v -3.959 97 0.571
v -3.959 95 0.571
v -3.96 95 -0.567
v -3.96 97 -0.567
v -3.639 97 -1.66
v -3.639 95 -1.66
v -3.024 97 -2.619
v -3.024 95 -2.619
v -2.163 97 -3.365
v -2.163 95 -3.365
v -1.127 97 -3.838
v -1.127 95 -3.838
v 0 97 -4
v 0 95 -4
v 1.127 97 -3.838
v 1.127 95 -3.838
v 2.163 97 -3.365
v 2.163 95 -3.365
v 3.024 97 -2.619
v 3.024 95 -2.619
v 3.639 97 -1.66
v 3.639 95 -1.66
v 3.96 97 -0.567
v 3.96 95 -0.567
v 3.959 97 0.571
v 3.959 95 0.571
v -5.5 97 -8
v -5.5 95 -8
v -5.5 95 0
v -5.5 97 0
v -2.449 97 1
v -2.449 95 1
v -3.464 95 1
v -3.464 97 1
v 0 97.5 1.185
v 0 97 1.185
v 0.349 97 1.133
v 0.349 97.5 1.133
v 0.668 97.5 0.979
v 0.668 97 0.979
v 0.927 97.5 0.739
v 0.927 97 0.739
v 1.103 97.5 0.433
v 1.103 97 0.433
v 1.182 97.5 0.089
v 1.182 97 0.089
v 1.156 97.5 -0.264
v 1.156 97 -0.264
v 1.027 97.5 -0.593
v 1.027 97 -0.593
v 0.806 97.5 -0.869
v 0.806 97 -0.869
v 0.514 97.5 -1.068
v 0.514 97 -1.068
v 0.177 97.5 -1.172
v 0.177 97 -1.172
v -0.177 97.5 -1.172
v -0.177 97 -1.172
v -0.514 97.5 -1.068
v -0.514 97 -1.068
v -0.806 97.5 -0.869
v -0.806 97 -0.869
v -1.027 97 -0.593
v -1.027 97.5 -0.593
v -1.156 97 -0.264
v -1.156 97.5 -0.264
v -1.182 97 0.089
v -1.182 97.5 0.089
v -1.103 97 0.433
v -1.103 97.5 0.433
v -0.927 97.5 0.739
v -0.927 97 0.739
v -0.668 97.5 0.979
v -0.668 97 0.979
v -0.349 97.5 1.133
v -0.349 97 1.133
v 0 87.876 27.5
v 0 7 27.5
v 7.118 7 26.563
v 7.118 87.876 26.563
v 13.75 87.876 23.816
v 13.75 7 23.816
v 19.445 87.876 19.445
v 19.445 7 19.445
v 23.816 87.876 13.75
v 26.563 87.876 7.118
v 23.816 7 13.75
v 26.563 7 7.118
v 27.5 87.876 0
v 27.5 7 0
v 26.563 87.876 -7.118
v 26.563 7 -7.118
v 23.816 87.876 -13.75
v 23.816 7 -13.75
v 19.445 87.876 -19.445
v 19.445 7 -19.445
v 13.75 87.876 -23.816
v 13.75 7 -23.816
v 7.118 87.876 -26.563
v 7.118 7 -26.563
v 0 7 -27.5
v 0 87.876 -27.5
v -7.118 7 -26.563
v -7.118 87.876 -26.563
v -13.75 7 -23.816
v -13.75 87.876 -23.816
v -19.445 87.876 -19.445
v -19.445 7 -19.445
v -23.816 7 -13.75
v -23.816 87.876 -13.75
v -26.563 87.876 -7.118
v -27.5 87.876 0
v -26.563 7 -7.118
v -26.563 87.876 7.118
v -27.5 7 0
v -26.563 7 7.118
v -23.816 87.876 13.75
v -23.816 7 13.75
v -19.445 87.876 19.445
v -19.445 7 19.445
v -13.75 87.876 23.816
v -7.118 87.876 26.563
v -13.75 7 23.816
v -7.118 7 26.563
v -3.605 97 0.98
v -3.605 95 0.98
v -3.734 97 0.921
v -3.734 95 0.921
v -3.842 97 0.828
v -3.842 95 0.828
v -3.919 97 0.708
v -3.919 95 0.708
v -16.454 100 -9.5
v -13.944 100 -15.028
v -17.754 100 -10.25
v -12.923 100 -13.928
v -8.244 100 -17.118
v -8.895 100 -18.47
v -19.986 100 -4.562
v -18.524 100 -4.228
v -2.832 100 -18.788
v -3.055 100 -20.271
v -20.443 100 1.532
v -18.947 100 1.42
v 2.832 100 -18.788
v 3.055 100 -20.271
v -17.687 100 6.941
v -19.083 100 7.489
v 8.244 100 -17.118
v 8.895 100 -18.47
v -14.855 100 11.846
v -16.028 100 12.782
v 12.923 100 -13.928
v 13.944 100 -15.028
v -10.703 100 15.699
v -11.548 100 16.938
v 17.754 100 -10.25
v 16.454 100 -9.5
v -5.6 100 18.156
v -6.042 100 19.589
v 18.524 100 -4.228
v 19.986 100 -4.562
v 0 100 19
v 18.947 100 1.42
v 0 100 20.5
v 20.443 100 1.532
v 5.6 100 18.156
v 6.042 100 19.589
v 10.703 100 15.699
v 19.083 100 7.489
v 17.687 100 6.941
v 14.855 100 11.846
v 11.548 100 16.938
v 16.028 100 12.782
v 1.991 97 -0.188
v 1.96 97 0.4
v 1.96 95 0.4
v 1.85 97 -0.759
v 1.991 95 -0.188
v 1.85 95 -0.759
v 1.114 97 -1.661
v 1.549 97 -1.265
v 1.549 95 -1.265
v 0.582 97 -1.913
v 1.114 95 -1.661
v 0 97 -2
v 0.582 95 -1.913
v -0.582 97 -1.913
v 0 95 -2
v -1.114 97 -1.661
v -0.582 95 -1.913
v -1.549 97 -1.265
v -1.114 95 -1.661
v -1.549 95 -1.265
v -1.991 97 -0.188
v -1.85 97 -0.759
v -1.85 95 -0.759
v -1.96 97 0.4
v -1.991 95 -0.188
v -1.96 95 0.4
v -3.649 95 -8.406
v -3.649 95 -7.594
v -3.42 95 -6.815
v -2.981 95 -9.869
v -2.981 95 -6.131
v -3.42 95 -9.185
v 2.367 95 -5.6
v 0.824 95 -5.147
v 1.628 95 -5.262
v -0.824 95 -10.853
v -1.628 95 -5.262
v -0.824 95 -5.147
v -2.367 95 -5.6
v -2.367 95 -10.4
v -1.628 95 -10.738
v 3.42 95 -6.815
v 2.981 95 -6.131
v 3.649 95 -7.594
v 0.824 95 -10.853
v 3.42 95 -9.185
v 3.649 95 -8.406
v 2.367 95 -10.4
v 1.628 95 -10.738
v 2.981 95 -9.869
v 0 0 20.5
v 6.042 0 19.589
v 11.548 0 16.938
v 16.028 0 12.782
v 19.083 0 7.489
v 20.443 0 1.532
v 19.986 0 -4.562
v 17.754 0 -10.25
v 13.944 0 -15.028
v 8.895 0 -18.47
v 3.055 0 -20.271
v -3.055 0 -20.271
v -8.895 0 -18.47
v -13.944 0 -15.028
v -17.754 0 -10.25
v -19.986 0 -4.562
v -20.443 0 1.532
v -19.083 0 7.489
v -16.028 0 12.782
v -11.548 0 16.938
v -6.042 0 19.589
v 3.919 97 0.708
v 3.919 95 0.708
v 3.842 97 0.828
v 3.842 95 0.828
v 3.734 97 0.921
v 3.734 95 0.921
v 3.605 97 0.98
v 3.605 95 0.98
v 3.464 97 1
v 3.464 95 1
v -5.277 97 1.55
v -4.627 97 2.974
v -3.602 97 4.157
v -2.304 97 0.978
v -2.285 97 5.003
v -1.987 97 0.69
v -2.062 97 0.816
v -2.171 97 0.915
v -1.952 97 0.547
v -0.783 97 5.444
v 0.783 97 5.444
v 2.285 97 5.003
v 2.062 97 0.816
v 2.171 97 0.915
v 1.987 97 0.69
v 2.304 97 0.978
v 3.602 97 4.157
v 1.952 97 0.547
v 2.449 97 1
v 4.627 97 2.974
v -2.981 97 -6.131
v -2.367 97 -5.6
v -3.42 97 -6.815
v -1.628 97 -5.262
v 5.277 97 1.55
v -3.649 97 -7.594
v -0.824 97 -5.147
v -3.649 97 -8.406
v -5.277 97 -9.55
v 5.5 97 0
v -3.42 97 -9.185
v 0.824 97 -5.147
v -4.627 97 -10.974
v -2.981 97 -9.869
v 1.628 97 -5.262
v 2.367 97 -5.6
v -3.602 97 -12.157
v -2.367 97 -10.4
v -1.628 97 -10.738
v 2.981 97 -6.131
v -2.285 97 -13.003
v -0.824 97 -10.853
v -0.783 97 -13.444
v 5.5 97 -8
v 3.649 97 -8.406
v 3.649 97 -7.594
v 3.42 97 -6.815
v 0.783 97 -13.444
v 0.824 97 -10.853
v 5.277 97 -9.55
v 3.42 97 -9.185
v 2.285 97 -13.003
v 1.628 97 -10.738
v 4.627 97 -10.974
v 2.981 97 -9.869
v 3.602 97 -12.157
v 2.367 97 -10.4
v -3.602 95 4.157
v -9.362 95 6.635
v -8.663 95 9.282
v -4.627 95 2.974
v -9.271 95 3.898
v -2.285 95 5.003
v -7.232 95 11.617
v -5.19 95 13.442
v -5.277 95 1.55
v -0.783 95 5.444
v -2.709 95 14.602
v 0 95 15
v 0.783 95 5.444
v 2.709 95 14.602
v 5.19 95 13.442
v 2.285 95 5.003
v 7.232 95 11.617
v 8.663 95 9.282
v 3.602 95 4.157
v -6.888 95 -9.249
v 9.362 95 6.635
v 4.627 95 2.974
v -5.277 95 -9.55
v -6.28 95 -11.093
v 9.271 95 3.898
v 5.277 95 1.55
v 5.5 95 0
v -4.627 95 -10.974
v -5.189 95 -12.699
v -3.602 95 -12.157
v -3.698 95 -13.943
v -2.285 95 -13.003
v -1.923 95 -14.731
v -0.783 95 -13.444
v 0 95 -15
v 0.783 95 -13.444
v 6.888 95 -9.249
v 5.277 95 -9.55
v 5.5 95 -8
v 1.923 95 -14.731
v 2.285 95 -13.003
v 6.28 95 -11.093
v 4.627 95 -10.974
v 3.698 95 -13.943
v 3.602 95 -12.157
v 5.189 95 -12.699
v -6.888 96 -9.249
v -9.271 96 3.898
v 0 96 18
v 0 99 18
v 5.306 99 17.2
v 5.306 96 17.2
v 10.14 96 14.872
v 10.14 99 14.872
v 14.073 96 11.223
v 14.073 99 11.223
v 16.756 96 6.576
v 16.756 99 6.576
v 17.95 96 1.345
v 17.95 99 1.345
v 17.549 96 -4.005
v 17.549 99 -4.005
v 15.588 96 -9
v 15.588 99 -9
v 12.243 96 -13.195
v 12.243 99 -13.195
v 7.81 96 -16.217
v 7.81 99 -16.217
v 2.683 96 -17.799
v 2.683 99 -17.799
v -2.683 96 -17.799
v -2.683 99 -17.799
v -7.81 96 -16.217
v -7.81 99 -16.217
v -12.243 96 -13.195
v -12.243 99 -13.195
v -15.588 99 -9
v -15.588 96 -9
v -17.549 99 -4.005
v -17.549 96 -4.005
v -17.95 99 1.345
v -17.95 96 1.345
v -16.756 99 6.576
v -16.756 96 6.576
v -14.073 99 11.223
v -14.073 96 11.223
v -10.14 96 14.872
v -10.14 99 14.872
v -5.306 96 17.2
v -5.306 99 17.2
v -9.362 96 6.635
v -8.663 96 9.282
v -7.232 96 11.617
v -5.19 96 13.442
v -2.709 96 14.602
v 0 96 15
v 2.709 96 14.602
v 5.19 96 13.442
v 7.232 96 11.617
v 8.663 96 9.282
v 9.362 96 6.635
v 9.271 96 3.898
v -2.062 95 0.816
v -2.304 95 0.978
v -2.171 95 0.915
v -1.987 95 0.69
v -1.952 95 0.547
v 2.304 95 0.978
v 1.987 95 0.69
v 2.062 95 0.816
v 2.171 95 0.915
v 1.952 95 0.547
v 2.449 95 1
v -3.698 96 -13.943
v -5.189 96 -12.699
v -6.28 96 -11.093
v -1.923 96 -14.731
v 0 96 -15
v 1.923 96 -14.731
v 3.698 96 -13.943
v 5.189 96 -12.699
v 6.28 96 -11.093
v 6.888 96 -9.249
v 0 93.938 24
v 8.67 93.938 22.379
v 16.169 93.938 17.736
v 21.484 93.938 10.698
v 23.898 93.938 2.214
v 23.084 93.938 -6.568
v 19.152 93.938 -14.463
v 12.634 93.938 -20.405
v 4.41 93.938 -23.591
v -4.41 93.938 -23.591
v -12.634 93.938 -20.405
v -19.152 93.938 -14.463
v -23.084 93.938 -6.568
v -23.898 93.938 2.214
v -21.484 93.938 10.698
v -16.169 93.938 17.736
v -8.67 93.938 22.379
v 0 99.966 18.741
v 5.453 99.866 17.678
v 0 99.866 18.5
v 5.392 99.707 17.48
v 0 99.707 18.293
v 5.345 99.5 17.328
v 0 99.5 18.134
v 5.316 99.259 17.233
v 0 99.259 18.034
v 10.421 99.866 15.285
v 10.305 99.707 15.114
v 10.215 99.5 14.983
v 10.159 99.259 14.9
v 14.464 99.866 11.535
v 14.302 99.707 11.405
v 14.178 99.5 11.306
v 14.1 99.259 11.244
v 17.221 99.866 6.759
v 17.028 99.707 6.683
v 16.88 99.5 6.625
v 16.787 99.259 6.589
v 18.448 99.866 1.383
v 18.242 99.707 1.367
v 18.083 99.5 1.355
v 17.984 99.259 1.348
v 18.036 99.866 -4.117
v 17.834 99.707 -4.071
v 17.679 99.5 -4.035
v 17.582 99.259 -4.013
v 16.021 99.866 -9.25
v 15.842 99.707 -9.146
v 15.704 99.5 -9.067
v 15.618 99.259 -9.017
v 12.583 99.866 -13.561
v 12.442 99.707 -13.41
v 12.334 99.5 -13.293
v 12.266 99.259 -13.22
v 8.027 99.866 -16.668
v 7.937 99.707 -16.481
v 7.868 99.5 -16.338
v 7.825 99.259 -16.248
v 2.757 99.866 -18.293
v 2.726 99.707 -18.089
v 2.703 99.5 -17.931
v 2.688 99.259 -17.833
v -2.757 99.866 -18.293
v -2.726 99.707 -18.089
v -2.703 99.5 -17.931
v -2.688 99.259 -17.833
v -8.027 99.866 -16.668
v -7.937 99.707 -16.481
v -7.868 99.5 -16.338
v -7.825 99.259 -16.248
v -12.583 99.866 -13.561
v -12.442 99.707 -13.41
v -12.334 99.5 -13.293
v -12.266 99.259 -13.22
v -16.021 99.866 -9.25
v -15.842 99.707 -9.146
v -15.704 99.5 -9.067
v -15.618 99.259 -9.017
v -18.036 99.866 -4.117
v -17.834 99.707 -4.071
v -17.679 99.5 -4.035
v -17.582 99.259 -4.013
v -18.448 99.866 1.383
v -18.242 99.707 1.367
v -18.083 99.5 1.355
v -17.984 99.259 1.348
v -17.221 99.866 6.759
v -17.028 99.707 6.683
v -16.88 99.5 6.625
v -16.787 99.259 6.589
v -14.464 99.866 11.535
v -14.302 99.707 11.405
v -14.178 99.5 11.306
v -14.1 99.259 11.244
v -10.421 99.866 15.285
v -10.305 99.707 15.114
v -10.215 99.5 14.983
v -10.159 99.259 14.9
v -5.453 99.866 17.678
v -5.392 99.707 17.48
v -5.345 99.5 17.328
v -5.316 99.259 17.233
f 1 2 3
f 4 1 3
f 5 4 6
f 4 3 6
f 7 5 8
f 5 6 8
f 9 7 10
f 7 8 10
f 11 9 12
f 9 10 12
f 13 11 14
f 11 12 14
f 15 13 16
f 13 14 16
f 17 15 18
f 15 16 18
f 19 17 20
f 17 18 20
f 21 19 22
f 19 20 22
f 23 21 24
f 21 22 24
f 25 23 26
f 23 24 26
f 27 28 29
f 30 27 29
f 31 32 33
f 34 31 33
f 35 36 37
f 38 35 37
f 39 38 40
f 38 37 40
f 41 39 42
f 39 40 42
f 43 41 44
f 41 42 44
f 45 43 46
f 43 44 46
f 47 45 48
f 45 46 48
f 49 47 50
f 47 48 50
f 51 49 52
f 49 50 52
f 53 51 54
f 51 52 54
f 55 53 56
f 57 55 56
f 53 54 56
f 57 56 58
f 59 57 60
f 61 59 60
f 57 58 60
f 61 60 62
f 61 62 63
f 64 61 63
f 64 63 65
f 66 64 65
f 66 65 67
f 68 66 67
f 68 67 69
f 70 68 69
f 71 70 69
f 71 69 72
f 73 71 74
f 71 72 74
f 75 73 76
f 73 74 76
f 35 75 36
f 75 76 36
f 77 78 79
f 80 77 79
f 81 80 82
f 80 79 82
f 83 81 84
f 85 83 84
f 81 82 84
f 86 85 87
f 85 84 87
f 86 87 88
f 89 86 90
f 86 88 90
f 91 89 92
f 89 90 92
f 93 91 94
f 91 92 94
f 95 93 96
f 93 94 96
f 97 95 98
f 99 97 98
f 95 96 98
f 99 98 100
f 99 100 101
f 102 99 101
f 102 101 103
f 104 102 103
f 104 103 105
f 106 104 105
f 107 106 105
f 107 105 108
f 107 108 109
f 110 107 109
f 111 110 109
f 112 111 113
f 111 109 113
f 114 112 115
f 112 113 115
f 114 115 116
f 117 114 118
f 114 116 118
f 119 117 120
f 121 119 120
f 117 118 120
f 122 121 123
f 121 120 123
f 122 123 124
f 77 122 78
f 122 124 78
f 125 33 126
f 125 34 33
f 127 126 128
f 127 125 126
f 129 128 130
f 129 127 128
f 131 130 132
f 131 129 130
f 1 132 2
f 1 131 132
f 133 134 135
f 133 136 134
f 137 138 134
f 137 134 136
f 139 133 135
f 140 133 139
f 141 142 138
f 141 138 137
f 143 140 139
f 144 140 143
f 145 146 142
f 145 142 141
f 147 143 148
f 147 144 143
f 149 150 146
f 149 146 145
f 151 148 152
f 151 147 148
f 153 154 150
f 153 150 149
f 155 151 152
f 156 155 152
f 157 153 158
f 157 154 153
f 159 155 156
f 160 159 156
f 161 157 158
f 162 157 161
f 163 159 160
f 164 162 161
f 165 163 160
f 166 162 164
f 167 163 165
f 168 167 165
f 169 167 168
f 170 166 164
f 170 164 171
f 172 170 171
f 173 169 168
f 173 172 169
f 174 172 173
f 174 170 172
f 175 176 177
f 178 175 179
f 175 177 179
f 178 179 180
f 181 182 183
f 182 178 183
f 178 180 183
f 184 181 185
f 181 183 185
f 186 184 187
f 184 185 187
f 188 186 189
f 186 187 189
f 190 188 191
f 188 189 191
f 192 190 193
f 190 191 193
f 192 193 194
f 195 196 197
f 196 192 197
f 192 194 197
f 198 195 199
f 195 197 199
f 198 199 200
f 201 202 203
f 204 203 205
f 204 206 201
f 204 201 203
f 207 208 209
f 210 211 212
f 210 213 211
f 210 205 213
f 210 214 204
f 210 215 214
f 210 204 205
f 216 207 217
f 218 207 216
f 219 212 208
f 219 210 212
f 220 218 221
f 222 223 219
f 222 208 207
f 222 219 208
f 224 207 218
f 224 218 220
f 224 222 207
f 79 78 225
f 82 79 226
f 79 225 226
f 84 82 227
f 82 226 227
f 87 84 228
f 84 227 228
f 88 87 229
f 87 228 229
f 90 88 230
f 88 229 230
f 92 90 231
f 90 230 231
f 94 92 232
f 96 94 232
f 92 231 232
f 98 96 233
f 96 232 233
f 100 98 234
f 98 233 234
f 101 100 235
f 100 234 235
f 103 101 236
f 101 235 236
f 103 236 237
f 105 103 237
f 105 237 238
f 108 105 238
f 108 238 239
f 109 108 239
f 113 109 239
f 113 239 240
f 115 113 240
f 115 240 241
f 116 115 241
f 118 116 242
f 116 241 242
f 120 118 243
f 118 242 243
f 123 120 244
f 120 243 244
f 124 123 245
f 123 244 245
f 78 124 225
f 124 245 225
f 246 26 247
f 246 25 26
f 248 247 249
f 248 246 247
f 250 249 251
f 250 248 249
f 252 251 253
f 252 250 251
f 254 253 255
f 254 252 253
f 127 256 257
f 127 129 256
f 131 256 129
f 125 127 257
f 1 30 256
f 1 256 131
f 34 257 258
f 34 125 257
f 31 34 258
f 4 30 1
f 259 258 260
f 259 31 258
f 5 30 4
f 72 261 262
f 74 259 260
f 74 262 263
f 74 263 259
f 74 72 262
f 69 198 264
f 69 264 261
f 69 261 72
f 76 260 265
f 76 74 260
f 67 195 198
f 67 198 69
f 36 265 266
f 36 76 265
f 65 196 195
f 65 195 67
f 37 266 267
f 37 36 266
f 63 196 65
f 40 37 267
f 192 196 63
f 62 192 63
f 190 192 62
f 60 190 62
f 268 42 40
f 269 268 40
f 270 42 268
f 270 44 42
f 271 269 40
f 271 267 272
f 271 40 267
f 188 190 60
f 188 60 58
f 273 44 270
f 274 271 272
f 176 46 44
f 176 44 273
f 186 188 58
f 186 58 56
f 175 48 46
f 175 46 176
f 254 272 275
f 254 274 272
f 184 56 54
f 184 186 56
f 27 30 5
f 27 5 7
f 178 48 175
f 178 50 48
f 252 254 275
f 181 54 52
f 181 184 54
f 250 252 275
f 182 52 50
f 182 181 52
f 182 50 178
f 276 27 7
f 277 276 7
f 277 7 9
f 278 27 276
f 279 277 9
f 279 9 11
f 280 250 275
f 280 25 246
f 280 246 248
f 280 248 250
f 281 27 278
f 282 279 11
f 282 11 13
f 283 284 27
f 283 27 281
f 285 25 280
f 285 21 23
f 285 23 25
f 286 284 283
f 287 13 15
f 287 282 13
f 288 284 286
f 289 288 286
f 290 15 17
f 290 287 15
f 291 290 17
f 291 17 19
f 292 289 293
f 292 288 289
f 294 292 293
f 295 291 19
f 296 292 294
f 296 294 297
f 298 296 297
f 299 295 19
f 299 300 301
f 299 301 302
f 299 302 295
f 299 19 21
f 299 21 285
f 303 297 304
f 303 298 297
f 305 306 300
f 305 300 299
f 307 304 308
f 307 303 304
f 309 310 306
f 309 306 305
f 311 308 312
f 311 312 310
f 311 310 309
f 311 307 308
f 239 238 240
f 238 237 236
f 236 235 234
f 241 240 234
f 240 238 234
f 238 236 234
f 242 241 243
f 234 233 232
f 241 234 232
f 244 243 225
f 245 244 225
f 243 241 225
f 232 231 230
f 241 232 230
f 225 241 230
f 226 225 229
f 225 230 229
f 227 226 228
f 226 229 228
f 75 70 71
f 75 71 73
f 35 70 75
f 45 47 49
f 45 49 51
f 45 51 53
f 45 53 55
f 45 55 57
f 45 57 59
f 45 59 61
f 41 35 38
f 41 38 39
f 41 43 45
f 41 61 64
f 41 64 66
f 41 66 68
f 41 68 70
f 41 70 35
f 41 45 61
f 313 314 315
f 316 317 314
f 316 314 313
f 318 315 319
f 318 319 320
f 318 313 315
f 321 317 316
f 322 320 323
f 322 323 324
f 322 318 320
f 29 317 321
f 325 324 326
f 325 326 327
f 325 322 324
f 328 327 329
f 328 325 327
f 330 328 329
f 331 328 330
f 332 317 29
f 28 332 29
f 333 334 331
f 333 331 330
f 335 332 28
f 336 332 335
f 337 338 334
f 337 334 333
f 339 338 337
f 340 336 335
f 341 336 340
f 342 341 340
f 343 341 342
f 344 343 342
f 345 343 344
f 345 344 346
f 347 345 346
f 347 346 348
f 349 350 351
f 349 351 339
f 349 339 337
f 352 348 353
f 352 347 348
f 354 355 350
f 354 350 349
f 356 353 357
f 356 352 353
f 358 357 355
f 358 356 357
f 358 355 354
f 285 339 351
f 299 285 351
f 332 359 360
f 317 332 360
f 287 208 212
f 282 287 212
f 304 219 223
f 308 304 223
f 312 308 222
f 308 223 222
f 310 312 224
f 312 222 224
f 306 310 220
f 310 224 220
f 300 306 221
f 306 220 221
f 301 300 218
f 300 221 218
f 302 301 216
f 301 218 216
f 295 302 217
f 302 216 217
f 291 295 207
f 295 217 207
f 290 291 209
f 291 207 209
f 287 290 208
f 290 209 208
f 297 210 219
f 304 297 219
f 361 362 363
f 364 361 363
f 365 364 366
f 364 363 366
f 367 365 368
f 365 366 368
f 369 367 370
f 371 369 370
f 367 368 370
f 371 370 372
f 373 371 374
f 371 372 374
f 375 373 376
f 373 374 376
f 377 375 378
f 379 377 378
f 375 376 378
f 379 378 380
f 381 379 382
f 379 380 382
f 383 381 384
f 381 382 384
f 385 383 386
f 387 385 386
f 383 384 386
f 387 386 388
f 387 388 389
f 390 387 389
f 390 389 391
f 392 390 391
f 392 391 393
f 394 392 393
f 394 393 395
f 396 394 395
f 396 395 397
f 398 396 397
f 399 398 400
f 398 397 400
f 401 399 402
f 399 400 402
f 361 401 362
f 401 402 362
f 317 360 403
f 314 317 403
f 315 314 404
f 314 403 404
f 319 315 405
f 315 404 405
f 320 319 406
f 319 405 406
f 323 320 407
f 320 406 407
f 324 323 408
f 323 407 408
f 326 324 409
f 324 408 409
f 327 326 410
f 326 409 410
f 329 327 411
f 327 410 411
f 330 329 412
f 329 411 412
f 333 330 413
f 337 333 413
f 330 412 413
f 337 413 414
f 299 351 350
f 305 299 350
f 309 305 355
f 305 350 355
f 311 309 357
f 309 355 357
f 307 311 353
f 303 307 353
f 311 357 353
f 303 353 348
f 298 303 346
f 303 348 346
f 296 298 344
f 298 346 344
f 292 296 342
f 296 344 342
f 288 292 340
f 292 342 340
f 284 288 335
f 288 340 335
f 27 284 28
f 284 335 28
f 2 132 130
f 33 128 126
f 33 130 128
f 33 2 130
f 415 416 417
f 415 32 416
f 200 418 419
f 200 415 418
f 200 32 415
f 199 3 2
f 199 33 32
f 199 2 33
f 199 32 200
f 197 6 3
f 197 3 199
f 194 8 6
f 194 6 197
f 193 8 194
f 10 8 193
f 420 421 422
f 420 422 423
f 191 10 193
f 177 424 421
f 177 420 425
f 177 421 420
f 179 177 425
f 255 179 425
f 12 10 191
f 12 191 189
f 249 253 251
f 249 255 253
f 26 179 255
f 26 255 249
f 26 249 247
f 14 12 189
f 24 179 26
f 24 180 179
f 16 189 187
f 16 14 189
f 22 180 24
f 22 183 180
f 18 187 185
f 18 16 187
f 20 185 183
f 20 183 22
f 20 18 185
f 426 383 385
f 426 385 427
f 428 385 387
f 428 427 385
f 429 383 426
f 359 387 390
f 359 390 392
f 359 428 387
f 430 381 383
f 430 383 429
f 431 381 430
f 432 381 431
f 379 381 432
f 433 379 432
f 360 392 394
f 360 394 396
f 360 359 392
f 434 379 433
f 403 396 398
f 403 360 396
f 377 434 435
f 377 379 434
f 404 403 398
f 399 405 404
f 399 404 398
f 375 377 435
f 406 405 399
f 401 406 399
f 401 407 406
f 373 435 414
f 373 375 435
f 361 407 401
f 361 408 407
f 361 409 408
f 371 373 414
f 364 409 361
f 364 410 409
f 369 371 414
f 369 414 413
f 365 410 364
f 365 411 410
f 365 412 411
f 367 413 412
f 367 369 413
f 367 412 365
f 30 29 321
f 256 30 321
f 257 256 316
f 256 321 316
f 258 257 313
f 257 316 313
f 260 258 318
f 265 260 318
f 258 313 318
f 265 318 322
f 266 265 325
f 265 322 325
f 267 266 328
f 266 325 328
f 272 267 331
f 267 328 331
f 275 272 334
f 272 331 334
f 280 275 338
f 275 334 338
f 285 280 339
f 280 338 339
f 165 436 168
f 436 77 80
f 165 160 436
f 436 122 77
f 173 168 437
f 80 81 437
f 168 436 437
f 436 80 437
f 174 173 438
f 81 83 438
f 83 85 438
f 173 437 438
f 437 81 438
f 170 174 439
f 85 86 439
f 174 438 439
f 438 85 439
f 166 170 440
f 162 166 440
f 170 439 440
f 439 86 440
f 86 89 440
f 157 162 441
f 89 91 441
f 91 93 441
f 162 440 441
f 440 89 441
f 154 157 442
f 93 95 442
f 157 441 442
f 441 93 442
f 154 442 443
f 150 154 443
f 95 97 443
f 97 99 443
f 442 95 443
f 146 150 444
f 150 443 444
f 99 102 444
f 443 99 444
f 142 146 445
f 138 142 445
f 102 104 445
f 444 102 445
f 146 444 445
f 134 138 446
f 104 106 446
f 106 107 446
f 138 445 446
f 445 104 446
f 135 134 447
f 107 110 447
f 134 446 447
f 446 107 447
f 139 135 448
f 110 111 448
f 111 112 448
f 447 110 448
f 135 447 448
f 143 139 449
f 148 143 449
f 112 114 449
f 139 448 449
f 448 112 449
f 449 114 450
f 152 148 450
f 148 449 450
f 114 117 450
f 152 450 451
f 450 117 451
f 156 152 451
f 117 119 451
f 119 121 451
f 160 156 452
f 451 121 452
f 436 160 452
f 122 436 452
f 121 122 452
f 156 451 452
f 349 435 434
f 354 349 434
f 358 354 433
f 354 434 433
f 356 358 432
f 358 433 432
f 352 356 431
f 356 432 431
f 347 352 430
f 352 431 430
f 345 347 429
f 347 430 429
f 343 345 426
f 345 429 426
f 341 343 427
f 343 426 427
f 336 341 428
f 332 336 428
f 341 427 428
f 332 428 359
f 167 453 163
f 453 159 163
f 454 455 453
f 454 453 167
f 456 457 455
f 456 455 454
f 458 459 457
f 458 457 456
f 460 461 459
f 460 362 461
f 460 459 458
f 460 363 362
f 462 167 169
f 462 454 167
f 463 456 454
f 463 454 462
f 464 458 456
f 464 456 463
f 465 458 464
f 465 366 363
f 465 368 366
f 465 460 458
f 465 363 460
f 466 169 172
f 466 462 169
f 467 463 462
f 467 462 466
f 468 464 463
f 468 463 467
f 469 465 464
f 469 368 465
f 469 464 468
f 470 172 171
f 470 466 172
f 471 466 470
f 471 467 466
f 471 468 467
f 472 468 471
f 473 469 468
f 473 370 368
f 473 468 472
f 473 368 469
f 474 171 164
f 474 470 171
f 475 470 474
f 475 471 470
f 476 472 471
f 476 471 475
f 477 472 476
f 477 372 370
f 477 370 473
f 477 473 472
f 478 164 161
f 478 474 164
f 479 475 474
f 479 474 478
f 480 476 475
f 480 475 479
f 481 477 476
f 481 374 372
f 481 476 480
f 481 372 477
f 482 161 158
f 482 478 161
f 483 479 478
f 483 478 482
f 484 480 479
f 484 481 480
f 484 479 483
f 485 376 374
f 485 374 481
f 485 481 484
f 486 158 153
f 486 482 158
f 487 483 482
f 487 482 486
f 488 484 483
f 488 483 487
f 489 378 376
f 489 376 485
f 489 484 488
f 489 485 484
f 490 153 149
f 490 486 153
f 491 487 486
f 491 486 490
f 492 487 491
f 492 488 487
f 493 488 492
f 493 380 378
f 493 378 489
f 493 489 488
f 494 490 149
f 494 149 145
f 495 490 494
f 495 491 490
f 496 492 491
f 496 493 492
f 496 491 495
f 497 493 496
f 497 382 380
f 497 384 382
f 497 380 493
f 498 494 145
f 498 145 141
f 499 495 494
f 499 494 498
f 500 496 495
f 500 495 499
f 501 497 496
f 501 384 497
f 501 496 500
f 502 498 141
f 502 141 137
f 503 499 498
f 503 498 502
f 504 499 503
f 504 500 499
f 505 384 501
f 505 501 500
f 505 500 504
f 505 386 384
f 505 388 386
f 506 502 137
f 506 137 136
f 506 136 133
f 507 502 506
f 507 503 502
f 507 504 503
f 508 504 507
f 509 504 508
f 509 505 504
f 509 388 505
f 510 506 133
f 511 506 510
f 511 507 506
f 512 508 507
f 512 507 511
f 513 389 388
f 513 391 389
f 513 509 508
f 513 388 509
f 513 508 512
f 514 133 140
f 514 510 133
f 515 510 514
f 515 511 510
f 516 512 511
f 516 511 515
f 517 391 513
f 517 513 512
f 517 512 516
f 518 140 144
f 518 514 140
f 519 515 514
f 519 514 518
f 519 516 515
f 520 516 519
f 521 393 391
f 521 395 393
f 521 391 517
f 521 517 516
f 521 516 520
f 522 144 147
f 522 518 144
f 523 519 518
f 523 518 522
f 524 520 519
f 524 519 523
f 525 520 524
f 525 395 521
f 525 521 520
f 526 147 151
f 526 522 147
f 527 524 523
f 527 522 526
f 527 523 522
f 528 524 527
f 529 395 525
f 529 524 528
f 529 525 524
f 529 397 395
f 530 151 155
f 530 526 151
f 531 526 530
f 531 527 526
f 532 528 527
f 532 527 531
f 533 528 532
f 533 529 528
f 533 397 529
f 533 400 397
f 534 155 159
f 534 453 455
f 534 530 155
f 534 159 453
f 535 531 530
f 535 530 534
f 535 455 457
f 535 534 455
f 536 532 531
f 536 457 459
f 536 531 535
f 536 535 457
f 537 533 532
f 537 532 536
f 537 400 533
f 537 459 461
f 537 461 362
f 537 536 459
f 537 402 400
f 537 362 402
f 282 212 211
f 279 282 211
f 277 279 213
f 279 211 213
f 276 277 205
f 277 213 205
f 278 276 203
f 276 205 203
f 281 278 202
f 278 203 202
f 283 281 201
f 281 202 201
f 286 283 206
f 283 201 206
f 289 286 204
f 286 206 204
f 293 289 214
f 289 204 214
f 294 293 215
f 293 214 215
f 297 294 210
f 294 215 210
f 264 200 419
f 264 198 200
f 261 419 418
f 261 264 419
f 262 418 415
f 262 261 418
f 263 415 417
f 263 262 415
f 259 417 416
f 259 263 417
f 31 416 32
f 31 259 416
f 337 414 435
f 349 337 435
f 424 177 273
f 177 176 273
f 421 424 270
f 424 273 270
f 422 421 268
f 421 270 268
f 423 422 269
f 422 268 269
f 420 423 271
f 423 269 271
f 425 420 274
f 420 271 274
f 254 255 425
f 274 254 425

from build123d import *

# Parameters (mm, degrees)
SKETCH1_R           = 27.5
BOSS_EXTRUDE1_DEPTH = 100
CHAMFER1_SIZE       = 7
CHAMFER1_SIZE2      = 12.124355653
CHAMFER2_SIZE       = 7
SKETCH2_R           = 18
CUT_EXTRUDE1_DEPTH  = 4
FILLET1_R           = 1
CUT_EXTRUDE2_DEPTH  = 1
SKETCH6_R           = 2
BOSS_EXTRUDE2_DEPTH = 2
FILLET2_R           = 0.5
SKETCH7_R           = 1.185349533
BOSS_EXTRUDE3_DEPTH = 0.5


with BuildPart() as part:
    # Sketch1 → Boss-Extrude1 (new body)
    with BuildSketch(Plane(origin=(0, 0, 0), x_dir=(1, 0, 0), z_dir=(0, 1, 0))):
        with Locations(Location((0, 0, 0), (0, 0, 270))):
            Circle(SKETCH1_R)
    extrude(amount=BOSS_EXTRUDE1_DEPTH)

    # Chamfer1
    chamfer1_edges = [part.edges().sort_by_distance(p)[0] for p in [
        (0, 100, -27.5),
    ]]
    chamfer1_side = [part.faces().sort_by_distance(p)[0] for p in [
        (0, 100, 0),
    ]]
    chamfer(chamfer1_edges, length=CHAMFER1_SIZE, length2=CHAMFER1_SIZE2, reference=chamfer1_side[0])

    # Chamfer2
    chamfer2_edges = [part.edges().sort_by_distance(p)[0] for p in [
        (0, 0, -27.5),
    ]]
    chamfer(chamfer2_edges, length=CHAMFER2_SIZE)

    # Sketch2 → Cut-Extrude1 (cut)
    with BuildSketch(Plane(origin=(0, 100, 0), x_dir=(1, 0, 0), z_dir=(0, 1, 0))):
        with Locations(Location((0, 0, 0), (0, 0, 270))):
            Circle(SKETCH2_R)
    extrude(amount=-CUT_EXTRUDE1_DEPTH, mode=Mode.SUBTRACT)

    # Fillet1
    fillet1_edges = [part.edges().sort_by_distance(p)[0] for p in [
        (0, 100, -18),
    ]]
    fillet(fillet1_edges, radius=FILLET1_R)

    # Sketch4 → Cut-Extrude2 (cut)
    with BuildSketch(Plane(origin=(0, 96, 0), x_dir=(1, 0, 0), z_dir=(0, 1, 0))):
        with BuildLine():
            ThreePointArc((-9.270739516, -3.897699019), (0, -15), (9.270739516, -3.897699019))
            Line((9.270739516, -3.897699019), (6.887755938, 9.248526385))
            ThreePointArc((6.887755938, 9.248526385), (0, 15), (-6.887755938, 9.248526385))
            Line((-6.887755938, 9.248526385), (-9.270739516, -3.897699019))
        make_face()
    extrude(amount=-CUT_EXTRUDE2_DEPTH, mode=Mode.SUBTRACT)

    # Sketch6 → Boss-Extrude2 (add)
    # profile 1 of 2: a face of its own
    with BuildSketch(Plane(origin=(0, 95, 0), x_dir=(1, 0, 0), z_dir=(0, 1, 0))):
        with BuildLine():
            Line((-5.5, 8), (-5.5, 0))
            ThreePointArc((-5.5, 0), (0, -5.5), (5.5, 0))
            Line((5.5, 0), (5.5, 8))
            ThreePointArc((5.5, 8), (0, 13.5), (-5.5, 8))
        make_face()
        with BuildLine():
            Line((3.872983346, -1), (1.732050808, -1))
            ThreePointArc((1.732050808, -1), (0, -2), (-1.732050808, -1))
            Line((-1.732050808, -1), (-3.872983346, -1))
            ThreePointArc((-3.872983346, -1), (0, 4), (3.872983346, -1))
        make_face(mode=Mode.SUBTRACT)
        with BuildLine():
            ThreePointArc((-0.824231798, 5.146617712), (-3.677614086, 8), (-0.824231798, 10.853382288))
            Line((-0.824231798, 10.853382288), (0.824231798, 10.853382288))
            ThreePointArc((0.824231798, 10.853382288), (3.677614086, 8), (0.824231798, 5.146617712))
            Line((0.824231798, 5.146617712), (-0.824231798, 5.146617712))
        make_face(mode=Mode.SUBTRACT)
    # profile 2 of 2: a face of its own
    with BuildSketch(Plane(origin=(0, 95, 0), x_dir=(1, 0, 0), z_dir=(0, 1, 0))):
        Circle(SKETCH6_R)
    extrude(amount=BOSS_EXTRUDE2_DEPTH)

    # Fillet2
    fillet2_edges = [part.edges().sort_by_distance(p)[0] for p in [
        (-3.872983346, 96, 1),
        (3.872983346, 96, 1),
        (1.732050808, 96, 1),
        (-1.732050808, 96, 1),
    ]]
    fillet(fillet2_edges, radius=FILLET2_R)

    # Sketch7 → Boss-Extrude3 (add)
    with BuildSketch(Plane(origin=(0, 97, 0), x_dir=(1, 0, 0), z_dir=(0, 1, 0))):
        with Locations(Location((0, 0, 0), (0, 0, 270))):
            Circle(SKETCH7_R)
    extrude(amount=BOSS_EXTRUDE3_DEPTH)


solid = part.part
